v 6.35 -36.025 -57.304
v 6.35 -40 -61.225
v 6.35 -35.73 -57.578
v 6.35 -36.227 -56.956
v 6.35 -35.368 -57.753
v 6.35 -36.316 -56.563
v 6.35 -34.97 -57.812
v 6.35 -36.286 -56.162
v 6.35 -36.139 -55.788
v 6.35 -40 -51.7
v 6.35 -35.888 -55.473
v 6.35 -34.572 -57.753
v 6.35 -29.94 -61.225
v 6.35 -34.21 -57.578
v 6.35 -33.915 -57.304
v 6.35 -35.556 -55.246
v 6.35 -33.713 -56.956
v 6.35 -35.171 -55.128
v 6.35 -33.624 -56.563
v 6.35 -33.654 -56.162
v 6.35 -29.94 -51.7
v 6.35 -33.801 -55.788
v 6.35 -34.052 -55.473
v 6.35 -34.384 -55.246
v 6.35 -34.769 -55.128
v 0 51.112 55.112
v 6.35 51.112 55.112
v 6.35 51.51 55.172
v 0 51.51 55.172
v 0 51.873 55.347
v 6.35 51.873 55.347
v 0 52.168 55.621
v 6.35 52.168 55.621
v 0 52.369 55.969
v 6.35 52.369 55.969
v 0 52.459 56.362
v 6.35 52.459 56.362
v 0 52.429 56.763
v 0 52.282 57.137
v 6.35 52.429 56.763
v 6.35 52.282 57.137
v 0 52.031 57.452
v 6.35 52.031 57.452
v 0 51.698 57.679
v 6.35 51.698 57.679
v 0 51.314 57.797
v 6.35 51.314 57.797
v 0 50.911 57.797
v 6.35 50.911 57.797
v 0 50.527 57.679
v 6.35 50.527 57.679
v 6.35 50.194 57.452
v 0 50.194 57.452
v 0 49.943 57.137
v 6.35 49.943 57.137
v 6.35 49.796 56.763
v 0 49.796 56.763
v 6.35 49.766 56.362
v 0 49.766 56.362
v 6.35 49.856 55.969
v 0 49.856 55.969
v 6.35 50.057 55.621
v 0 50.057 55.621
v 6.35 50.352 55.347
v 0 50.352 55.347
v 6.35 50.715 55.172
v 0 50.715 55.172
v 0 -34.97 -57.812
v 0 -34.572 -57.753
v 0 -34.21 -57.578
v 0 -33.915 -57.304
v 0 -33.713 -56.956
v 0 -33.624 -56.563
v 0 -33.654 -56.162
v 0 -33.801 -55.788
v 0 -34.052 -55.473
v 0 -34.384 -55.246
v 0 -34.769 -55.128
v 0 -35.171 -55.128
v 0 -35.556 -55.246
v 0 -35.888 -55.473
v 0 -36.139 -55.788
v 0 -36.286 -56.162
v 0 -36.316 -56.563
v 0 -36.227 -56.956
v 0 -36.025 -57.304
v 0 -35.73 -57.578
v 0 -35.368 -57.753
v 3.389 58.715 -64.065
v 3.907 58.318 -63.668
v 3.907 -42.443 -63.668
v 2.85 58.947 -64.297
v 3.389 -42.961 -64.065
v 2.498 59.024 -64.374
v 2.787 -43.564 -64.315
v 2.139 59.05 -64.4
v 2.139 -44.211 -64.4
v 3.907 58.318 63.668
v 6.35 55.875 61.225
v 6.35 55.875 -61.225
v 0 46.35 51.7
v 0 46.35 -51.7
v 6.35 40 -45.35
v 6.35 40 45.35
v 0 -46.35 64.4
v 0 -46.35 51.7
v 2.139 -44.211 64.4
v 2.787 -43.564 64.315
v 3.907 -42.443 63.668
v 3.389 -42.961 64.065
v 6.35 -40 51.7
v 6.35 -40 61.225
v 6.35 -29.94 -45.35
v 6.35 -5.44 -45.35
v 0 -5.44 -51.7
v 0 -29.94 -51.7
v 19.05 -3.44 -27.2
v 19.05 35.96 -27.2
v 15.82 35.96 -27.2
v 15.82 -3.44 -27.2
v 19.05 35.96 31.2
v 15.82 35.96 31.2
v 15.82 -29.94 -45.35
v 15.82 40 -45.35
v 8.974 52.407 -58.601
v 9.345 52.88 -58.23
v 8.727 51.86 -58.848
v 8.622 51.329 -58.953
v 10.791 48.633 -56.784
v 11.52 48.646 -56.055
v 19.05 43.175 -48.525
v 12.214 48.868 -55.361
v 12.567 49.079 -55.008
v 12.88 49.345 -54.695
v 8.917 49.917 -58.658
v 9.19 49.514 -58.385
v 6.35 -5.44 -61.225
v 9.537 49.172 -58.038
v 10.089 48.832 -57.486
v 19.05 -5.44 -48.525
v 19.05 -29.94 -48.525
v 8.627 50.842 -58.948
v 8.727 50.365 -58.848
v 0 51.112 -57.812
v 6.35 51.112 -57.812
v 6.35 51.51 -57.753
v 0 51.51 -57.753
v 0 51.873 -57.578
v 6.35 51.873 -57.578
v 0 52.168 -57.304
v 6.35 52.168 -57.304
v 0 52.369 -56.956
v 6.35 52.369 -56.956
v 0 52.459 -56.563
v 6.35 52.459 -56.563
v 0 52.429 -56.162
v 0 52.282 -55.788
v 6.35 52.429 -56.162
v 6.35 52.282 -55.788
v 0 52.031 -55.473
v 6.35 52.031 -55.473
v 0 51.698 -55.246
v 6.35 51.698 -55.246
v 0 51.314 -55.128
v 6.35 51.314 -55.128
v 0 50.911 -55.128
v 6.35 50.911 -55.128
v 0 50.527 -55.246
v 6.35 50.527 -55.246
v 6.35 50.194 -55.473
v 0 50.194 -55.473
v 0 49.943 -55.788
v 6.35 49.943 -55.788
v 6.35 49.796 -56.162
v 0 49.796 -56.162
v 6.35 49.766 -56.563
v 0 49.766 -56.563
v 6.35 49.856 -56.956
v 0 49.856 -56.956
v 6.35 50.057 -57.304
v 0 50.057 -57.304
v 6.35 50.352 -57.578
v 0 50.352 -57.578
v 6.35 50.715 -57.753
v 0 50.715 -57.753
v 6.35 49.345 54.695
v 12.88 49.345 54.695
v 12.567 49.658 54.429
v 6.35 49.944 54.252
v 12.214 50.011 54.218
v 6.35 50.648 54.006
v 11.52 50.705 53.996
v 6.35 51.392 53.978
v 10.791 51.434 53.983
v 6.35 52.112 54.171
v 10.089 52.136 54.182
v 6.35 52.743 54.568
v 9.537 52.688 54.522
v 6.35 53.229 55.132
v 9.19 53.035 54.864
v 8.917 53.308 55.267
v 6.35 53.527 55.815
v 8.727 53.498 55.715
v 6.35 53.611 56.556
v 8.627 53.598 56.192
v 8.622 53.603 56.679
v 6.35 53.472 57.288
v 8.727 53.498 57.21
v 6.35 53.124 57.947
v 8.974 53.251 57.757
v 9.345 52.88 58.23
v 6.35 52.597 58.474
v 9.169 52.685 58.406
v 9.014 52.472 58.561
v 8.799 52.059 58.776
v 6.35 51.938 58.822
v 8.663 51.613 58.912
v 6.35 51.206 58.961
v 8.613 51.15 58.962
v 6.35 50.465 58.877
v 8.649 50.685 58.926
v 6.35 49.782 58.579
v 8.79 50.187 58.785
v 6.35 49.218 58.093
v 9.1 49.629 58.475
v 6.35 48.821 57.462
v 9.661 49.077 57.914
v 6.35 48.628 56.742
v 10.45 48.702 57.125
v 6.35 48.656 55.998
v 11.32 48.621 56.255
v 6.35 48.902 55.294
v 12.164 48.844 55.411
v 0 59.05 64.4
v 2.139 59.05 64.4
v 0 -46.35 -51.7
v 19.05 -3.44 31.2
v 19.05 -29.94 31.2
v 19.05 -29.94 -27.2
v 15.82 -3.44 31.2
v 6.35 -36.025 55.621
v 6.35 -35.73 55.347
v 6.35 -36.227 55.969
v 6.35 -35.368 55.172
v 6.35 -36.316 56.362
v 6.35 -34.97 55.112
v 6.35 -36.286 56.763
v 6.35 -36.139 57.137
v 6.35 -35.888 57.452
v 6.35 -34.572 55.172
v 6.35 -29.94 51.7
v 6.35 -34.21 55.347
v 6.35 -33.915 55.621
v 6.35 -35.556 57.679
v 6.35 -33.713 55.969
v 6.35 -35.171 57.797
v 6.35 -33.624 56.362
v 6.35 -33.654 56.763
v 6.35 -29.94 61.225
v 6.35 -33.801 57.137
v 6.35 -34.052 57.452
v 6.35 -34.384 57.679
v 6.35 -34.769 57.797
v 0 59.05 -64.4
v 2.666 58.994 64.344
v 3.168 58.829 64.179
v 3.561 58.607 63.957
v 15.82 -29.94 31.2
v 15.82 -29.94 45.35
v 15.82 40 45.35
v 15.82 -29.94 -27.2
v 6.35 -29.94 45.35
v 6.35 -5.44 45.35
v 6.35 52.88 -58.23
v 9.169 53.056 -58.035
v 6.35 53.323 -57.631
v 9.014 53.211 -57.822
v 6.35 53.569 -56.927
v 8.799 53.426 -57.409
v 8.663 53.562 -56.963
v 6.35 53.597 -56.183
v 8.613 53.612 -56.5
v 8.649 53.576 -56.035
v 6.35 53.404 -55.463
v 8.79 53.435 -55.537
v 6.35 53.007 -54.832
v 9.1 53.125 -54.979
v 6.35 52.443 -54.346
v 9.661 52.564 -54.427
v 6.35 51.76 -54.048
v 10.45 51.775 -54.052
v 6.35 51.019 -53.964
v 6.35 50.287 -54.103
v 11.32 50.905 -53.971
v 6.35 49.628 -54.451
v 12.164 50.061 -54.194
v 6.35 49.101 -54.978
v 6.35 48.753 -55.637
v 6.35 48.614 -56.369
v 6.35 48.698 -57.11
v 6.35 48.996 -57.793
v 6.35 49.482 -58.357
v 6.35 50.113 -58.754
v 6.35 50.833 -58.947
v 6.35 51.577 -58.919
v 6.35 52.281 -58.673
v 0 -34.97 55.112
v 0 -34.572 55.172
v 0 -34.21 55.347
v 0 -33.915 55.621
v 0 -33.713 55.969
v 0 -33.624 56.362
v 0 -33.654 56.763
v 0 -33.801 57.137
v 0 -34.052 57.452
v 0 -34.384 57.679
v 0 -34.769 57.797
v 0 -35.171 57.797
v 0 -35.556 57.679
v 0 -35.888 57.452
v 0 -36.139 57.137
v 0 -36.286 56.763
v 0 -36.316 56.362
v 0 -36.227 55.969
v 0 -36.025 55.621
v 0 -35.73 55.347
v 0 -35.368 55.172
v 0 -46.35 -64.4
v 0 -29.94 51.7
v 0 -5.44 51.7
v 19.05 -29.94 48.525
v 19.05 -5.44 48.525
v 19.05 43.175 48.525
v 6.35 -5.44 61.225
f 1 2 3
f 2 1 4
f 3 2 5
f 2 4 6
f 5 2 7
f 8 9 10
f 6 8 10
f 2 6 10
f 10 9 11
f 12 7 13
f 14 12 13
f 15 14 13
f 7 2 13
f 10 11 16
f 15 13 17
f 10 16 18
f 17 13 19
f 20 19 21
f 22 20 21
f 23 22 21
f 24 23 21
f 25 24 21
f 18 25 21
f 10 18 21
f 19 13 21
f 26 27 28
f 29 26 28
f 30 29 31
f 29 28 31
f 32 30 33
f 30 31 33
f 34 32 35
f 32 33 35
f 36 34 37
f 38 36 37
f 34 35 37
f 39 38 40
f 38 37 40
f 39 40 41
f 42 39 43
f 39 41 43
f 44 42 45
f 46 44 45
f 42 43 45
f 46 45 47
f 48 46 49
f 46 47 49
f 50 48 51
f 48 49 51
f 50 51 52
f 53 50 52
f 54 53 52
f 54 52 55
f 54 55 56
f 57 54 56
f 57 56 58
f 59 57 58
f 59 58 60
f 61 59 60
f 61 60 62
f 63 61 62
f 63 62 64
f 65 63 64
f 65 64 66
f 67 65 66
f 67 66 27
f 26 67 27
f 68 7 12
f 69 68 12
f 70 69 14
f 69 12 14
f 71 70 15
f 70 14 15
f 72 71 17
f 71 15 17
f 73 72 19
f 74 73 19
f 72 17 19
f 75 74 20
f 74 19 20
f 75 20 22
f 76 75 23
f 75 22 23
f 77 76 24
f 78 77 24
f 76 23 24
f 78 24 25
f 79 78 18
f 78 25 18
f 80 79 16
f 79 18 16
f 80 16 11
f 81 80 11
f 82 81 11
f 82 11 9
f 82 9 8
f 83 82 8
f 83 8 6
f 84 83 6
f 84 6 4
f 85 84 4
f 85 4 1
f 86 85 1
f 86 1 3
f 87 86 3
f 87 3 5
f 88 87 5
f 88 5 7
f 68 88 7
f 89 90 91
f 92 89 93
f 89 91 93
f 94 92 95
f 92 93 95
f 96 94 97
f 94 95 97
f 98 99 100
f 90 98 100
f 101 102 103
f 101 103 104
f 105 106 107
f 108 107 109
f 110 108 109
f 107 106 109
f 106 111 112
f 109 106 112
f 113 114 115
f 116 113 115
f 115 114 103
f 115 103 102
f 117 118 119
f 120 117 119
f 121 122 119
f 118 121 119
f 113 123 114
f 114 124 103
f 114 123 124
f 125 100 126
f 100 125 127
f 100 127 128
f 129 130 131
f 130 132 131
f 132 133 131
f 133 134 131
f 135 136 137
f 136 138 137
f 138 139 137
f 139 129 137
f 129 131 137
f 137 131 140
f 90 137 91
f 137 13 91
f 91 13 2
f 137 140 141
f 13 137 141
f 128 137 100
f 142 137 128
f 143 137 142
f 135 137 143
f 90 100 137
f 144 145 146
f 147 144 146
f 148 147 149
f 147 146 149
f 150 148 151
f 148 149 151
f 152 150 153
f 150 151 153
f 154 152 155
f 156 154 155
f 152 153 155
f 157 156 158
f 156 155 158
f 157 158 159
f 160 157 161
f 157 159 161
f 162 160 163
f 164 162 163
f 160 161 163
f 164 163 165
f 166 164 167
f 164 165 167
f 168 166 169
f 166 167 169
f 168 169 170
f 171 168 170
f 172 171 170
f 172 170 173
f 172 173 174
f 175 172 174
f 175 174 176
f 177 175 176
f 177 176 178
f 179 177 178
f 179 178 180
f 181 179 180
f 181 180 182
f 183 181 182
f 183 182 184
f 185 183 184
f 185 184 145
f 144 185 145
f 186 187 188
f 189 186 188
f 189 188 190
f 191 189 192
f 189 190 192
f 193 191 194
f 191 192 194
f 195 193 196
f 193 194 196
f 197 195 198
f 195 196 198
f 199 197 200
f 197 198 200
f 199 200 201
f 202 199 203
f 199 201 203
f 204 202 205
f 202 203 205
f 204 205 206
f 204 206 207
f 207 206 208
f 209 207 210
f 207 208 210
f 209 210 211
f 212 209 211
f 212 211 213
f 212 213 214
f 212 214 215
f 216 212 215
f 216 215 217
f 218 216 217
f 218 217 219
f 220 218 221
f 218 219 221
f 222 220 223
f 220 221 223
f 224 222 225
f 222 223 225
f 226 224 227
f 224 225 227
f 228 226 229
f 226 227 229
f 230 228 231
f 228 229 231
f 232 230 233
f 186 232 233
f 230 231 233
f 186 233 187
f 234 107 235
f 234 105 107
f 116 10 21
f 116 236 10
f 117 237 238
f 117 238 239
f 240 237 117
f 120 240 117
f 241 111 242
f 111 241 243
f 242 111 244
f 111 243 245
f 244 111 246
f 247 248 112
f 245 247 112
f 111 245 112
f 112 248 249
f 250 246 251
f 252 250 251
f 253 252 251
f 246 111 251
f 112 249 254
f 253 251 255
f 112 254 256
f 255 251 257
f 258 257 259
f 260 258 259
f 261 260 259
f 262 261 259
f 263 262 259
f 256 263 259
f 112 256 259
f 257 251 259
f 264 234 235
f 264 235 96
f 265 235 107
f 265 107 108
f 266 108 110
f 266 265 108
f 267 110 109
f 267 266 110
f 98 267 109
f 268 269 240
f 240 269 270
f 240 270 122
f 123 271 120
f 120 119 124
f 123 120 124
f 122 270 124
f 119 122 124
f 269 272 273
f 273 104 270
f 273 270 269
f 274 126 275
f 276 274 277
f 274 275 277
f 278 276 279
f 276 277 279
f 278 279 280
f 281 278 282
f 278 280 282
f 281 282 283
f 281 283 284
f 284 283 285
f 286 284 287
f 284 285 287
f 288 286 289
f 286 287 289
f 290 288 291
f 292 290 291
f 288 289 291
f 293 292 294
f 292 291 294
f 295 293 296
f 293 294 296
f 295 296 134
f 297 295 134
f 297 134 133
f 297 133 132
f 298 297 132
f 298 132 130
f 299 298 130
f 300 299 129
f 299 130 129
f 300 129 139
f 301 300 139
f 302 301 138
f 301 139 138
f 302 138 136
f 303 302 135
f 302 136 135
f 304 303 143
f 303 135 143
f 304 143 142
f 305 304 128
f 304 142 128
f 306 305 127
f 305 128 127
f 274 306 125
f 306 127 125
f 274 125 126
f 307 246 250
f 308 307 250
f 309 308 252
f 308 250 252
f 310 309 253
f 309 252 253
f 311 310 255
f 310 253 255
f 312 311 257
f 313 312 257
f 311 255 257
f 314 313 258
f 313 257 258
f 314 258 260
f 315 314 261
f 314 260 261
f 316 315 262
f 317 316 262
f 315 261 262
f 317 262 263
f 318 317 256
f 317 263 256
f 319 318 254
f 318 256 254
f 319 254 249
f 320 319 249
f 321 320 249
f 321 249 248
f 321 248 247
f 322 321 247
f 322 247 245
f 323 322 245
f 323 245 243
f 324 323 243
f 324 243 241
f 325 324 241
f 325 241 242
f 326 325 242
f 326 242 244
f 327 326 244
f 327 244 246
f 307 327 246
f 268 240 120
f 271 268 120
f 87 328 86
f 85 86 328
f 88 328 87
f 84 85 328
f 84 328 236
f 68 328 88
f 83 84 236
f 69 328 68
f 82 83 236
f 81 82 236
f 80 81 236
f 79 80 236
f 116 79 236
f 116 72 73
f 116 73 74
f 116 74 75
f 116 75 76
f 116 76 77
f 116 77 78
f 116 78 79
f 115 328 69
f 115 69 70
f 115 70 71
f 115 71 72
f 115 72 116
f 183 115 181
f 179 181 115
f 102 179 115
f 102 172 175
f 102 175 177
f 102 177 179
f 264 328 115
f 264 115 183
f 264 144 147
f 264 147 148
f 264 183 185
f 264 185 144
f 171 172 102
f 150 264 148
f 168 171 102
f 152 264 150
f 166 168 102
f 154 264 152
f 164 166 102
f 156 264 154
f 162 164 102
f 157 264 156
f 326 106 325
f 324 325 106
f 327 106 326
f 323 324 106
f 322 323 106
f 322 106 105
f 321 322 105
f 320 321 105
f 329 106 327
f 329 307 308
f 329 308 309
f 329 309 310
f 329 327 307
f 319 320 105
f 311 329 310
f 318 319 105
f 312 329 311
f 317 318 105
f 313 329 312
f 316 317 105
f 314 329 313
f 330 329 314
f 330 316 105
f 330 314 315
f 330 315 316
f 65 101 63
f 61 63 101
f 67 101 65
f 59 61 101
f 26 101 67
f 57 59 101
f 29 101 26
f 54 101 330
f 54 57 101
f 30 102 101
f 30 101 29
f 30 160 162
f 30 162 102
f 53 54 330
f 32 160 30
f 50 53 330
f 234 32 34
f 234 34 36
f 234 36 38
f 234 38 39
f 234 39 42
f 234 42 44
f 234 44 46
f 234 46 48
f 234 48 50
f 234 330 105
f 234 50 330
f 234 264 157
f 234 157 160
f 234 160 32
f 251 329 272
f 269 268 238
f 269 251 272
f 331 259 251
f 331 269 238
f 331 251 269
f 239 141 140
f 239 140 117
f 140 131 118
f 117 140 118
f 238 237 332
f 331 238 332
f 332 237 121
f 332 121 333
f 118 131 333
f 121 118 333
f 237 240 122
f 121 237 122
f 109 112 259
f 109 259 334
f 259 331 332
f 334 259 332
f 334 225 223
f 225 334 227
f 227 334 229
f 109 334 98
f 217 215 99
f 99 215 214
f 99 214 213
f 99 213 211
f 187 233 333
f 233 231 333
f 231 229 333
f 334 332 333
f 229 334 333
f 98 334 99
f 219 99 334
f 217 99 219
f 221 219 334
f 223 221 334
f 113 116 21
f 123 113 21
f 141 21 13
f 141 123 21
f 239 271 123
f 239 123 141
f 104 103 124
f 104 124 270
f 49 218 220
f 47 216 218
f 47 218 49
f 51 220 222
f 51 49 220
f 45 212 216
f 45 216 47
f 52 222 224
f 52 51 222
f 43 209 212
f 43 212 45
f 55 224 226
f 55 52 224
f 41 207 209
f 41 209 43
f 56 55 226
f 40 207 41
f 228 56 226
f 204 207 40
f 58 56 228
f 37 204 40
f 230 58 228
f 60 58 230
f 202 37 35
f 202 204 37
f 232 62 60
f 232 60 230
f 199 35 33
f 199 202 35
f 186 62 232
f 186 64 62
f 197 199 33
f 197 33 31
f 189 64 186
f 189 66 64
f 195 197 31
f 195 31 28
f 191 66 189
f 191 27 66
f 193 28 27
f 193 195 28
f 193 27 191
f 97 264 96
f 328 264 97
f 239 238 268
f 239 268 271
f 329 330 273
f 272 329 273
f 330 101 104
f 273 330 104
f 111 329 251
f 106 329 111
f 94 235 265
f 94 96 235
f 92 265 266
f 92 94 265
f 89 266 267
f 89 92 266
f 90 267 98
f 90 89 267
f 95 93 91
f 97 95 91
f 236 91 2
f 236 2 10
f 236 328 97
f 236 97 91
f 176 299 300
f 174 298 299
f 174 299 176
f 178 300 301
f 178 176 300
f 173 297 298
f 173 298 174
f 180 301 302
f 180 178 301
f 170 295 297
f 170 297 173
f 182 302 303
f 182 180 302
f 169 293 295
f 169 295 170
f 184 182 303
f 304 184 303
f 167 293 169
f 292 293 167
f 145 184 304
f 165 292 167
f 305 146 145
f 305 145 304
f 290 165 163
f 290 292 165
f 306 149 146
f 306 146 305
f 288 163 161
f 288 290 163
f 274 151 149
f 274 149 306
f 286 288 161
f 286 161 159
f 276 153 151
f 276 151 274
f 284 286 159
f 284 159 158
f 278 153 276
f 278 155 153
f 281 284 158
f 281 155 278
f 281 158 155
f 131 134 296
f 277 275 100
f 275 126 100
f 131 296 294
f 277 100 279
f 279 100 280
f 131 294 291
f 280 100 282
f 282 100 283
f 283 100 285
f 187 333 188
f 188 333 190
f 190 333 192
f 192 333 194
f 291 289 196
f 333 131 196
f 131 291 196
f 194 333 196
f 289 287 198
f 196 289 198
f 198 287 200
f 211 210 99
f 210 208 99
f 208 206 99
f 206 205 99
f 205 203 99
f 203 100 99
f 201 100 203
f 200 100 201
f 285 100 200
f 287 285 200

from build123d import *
from build123d.topology import SkipClean

# Parameters (mm, degrees)
BOSS_EXTRUDE1_DEPTH = 6.35
CHAMFER1_SIZE       = 3.175
BOSS_EXTRUDE2_DEPTH = 12.7
CHAMFER2_SIZE       = 12.7
CHAMFER3_SIZE       = 6.35
SKETCH3_W           = 90.7
SKETCH3_H           = 45.44
CUT_EXTRUDE1_DEPTH  = 9.47
BOSS_EXTRUDE3_DEPTH = 24.5
CHAMFER4_SIZE       = 6.35
SKETCH5_R           = 1.35
CUT_EXTRUDE2_DEPTH  = 24.5
FILLET1_R           = 2.5
SKETCH6_W           = 58.4
SKETCH6_H           = 26.5
BOSS_EXTRUDE4_DEPTH = 3.23
SKETCH7_R           = 2.5
CUT_EXTRUDE4_DEPTH  = 12.7
SKETCH8_R           = 1.35
CUT_EXTRUDE5_DEPTH  = 89.292426062


with BuildPart() as part:
    # Sketch1 → Boss-Extrude1 (new body)
    with BuildSketch(Plane(origin=(0, 0, 0), x_dir=(0, 0, -1), z_dir=(1, 0, 0))):
        Polygon((-64.4, -46.35), (-64.4, 59.05), (64.4, 59.05), (64.4, -46.35), (51.7, -46.35), (51.7, 46.35), (-51.7, 46.35), (-51.7, -46.35), align=None)
    extrude(amount=BOSS_EXTRUDE1_DEPTH)

    # Chamfer1
    chamfer1_edges = [part.edges().sort_by_distance(p)[0] for p in [
        (6.35, 6.35, -64.4),
        (6.35, 59.05, 0),
        (6.35, 6.35, 64.4),
    ]]
    chamfer(chamfer1_edges, length=CHAMFER1_SIZE)

    # Sketch2 → Boss-Extrude2 (add)
    with BuildSketch(Plane(origin=(6.35, 0, 0), x_dir=(0, 0, -1), z_dir=(1, 0, 0))):
        Polygon((-51.7, -5.44), (-31.2, -5.44), (-31.2, 35.96), (27.2, 35.96), (27.2, -5.44), (51.7, -5.44), (51.7, 46.35), (-51.7, 46.35), align=None)
        Polygon((-61.225, -5.44), (-51.7, -5.44), (-51.7, 46.35), (51.7, 46.35), (51.7, -5.44), (61.225, -5.44), (61.225, 55.875), (-61.225, 55.875), align=None)
    extrude(amount=BOSS_EXTRUDE2_DEPTH)

    # Chamfer2
    chamfer2_edges = [part.edges().sort_by_distance(p)[0] for p in [
        (19.05, 25.2175, -61.225),
        (19.05, 55.875, 0),
        (19.05, 25.2175, 61.225),
    ]]
    chamfer(chamfer2_edges, length=CHAMFER2_SIZE - 0.0001)  # a hair under: the kernel refuses the full size

    # Chamfer3
    chamfer3_edges = [part.edges().sort_by_distance(p)[0] for p in [
        (6.35, 20.455, -51.7),
        (6.35, 46.35, 0),
        (6.35, 20.455, 51.7),
    ]]
    chamfer(chamfer3_edges, length=CHAMFER3_SIZE - 0.0001)  # a hair under: the kernel refuses the full size

    # Sketch3 → Cut-Extrude1 (cut)
    with BuildSketch(Plane.ZY.offset(-6.35)):
        with Locations((0, 17.28)):
            Rectangle(SKETCH3_W, SKETCH3_H)
    extrude(amount=-CUT_EXTRUDE1_DEPTH, mode=Mode.SUBTRACT)

    # Sketch4 → Boss-Extrude3 (add)
    with SkipClean():  # the faces are left unmerged after this step: merging them gives an invalid solid
        with BuildSketch(Plane.XZ.offset(5.44)):
            Polygon((15.82, -27.2), (15.82, -45.35), (6.35, -45.35), (0, -51.7), (6.35, -51.7), (6.35, -61.225), (19.05, -48.525), (19.05, -27.2), align=None)
            Polygon((0, 51.7), (6.35, 45.35), (15.82, 45.35), (15.82, 31.2), (19.05, 31.2), (19.05, 48.525), (6.35, 61.225), (6.35, 51.7), align=None)
        extrude(amount=BOSS_EXTRUDE3_DEPTH)

    # Chamfer4
    chamfer4_edges = [part.edges().sort_by_distance(p)[0] for p in [
        (6.35, -46.35, -56.4625),
        (6.35, -46.35, 56.4625),
    ]]
    chamfer(chamfer4_edges, length=CHAMFER4_SIZE - 0.0001)  # a hair under: the kernel refuses the full size

    # Sketch5 → Cut-Extrude2 (cut)
    with SkipClean():  # the faces are left unmerged after this step: merging them gives an invalid solid
        with BuildSketch(Plane(origin=(6.35, 0, 0), x_dir=(0, 0, -1), z_dir=(1, 0, 0))):
            with Locations((-56.4625, -34.97)):
                Circle(SKETCH5_R)
            with Locations((56.4625, -34.97)):
                Circle(SKETCH5_R)
        extrude(amount=-CUT_EXTRUDE2_DEPTH, mode=Mode.SUBTRACT)

    # Fillet1
    fillet1_edges = [part.edges().sort_by_distance(p)[0] for p in [
        (3.175, 7.93745, 64.4),
        (3.175, 7.93745, -64.4),
        (3.175, 59.05, 0),
    ]]
    fillet(fillet1_edges, radius=FILLET1_R)

    # Sketch6 → Boss-Extrude4 (add)
    with SkipClean():  # the faces are left unmerged after this step: merging them gives an invalid solid
        with BuildSketch(Plane(origin=(19.05, 0, 0), x_dir=(0, 0, -1), z_dir=(1, 0, 0))):
            with Locations((-2, -16.69)):
                Rectangle(SKETCH6_W, SKETCH6_H)
        extrude(amount=-BOSS_EXTRUDE4_DEPTH)

    # Sketch7 → Cut-Extrude4 (cut)
    with SkipClean():  # the faces are left unmerged after this step: merging them gives an invalid solid
        with BuildSketch(Plane(origin=(19.05, 0, 0), x_dir=(0, 0, -1), z_dir=(1, 0, 0))):
            with Locations(Location((-56.4625, 51.1125, 0), (0, 0, 315))):
                Circle(SKETCH7_R)
            with Locations(Location((56.4625, 51.1125, 0), (0, 0, 45))):
                Circle(SKETCH7_R)
        extrude(amount=-CUT_EXTRUDE4_DEPTH, mode=Mode.SUBTRACT)

    # Sketch8 → Cut-Extrude5 (cut, through all)
    with SkipClean():  # the faces are left unmerged after this step: merging them gives an invalid solid
        with BuildSketch(Plane(origin=(6.35, 0, 0), x_dir=(0, 0, -1), z_dir=(1, 0, 0))):
            with Locations((-56.4625, 51.1125)):
                Circle(SKETCH8_R)
            with Locations((56.4625, 51.1125)):
                Circle(SKETCH8_R)
        extrude(amount=-CUT_EXTRUDE5_DEPTH, mode=Mode.SUBTRACT)


solid = part.part
